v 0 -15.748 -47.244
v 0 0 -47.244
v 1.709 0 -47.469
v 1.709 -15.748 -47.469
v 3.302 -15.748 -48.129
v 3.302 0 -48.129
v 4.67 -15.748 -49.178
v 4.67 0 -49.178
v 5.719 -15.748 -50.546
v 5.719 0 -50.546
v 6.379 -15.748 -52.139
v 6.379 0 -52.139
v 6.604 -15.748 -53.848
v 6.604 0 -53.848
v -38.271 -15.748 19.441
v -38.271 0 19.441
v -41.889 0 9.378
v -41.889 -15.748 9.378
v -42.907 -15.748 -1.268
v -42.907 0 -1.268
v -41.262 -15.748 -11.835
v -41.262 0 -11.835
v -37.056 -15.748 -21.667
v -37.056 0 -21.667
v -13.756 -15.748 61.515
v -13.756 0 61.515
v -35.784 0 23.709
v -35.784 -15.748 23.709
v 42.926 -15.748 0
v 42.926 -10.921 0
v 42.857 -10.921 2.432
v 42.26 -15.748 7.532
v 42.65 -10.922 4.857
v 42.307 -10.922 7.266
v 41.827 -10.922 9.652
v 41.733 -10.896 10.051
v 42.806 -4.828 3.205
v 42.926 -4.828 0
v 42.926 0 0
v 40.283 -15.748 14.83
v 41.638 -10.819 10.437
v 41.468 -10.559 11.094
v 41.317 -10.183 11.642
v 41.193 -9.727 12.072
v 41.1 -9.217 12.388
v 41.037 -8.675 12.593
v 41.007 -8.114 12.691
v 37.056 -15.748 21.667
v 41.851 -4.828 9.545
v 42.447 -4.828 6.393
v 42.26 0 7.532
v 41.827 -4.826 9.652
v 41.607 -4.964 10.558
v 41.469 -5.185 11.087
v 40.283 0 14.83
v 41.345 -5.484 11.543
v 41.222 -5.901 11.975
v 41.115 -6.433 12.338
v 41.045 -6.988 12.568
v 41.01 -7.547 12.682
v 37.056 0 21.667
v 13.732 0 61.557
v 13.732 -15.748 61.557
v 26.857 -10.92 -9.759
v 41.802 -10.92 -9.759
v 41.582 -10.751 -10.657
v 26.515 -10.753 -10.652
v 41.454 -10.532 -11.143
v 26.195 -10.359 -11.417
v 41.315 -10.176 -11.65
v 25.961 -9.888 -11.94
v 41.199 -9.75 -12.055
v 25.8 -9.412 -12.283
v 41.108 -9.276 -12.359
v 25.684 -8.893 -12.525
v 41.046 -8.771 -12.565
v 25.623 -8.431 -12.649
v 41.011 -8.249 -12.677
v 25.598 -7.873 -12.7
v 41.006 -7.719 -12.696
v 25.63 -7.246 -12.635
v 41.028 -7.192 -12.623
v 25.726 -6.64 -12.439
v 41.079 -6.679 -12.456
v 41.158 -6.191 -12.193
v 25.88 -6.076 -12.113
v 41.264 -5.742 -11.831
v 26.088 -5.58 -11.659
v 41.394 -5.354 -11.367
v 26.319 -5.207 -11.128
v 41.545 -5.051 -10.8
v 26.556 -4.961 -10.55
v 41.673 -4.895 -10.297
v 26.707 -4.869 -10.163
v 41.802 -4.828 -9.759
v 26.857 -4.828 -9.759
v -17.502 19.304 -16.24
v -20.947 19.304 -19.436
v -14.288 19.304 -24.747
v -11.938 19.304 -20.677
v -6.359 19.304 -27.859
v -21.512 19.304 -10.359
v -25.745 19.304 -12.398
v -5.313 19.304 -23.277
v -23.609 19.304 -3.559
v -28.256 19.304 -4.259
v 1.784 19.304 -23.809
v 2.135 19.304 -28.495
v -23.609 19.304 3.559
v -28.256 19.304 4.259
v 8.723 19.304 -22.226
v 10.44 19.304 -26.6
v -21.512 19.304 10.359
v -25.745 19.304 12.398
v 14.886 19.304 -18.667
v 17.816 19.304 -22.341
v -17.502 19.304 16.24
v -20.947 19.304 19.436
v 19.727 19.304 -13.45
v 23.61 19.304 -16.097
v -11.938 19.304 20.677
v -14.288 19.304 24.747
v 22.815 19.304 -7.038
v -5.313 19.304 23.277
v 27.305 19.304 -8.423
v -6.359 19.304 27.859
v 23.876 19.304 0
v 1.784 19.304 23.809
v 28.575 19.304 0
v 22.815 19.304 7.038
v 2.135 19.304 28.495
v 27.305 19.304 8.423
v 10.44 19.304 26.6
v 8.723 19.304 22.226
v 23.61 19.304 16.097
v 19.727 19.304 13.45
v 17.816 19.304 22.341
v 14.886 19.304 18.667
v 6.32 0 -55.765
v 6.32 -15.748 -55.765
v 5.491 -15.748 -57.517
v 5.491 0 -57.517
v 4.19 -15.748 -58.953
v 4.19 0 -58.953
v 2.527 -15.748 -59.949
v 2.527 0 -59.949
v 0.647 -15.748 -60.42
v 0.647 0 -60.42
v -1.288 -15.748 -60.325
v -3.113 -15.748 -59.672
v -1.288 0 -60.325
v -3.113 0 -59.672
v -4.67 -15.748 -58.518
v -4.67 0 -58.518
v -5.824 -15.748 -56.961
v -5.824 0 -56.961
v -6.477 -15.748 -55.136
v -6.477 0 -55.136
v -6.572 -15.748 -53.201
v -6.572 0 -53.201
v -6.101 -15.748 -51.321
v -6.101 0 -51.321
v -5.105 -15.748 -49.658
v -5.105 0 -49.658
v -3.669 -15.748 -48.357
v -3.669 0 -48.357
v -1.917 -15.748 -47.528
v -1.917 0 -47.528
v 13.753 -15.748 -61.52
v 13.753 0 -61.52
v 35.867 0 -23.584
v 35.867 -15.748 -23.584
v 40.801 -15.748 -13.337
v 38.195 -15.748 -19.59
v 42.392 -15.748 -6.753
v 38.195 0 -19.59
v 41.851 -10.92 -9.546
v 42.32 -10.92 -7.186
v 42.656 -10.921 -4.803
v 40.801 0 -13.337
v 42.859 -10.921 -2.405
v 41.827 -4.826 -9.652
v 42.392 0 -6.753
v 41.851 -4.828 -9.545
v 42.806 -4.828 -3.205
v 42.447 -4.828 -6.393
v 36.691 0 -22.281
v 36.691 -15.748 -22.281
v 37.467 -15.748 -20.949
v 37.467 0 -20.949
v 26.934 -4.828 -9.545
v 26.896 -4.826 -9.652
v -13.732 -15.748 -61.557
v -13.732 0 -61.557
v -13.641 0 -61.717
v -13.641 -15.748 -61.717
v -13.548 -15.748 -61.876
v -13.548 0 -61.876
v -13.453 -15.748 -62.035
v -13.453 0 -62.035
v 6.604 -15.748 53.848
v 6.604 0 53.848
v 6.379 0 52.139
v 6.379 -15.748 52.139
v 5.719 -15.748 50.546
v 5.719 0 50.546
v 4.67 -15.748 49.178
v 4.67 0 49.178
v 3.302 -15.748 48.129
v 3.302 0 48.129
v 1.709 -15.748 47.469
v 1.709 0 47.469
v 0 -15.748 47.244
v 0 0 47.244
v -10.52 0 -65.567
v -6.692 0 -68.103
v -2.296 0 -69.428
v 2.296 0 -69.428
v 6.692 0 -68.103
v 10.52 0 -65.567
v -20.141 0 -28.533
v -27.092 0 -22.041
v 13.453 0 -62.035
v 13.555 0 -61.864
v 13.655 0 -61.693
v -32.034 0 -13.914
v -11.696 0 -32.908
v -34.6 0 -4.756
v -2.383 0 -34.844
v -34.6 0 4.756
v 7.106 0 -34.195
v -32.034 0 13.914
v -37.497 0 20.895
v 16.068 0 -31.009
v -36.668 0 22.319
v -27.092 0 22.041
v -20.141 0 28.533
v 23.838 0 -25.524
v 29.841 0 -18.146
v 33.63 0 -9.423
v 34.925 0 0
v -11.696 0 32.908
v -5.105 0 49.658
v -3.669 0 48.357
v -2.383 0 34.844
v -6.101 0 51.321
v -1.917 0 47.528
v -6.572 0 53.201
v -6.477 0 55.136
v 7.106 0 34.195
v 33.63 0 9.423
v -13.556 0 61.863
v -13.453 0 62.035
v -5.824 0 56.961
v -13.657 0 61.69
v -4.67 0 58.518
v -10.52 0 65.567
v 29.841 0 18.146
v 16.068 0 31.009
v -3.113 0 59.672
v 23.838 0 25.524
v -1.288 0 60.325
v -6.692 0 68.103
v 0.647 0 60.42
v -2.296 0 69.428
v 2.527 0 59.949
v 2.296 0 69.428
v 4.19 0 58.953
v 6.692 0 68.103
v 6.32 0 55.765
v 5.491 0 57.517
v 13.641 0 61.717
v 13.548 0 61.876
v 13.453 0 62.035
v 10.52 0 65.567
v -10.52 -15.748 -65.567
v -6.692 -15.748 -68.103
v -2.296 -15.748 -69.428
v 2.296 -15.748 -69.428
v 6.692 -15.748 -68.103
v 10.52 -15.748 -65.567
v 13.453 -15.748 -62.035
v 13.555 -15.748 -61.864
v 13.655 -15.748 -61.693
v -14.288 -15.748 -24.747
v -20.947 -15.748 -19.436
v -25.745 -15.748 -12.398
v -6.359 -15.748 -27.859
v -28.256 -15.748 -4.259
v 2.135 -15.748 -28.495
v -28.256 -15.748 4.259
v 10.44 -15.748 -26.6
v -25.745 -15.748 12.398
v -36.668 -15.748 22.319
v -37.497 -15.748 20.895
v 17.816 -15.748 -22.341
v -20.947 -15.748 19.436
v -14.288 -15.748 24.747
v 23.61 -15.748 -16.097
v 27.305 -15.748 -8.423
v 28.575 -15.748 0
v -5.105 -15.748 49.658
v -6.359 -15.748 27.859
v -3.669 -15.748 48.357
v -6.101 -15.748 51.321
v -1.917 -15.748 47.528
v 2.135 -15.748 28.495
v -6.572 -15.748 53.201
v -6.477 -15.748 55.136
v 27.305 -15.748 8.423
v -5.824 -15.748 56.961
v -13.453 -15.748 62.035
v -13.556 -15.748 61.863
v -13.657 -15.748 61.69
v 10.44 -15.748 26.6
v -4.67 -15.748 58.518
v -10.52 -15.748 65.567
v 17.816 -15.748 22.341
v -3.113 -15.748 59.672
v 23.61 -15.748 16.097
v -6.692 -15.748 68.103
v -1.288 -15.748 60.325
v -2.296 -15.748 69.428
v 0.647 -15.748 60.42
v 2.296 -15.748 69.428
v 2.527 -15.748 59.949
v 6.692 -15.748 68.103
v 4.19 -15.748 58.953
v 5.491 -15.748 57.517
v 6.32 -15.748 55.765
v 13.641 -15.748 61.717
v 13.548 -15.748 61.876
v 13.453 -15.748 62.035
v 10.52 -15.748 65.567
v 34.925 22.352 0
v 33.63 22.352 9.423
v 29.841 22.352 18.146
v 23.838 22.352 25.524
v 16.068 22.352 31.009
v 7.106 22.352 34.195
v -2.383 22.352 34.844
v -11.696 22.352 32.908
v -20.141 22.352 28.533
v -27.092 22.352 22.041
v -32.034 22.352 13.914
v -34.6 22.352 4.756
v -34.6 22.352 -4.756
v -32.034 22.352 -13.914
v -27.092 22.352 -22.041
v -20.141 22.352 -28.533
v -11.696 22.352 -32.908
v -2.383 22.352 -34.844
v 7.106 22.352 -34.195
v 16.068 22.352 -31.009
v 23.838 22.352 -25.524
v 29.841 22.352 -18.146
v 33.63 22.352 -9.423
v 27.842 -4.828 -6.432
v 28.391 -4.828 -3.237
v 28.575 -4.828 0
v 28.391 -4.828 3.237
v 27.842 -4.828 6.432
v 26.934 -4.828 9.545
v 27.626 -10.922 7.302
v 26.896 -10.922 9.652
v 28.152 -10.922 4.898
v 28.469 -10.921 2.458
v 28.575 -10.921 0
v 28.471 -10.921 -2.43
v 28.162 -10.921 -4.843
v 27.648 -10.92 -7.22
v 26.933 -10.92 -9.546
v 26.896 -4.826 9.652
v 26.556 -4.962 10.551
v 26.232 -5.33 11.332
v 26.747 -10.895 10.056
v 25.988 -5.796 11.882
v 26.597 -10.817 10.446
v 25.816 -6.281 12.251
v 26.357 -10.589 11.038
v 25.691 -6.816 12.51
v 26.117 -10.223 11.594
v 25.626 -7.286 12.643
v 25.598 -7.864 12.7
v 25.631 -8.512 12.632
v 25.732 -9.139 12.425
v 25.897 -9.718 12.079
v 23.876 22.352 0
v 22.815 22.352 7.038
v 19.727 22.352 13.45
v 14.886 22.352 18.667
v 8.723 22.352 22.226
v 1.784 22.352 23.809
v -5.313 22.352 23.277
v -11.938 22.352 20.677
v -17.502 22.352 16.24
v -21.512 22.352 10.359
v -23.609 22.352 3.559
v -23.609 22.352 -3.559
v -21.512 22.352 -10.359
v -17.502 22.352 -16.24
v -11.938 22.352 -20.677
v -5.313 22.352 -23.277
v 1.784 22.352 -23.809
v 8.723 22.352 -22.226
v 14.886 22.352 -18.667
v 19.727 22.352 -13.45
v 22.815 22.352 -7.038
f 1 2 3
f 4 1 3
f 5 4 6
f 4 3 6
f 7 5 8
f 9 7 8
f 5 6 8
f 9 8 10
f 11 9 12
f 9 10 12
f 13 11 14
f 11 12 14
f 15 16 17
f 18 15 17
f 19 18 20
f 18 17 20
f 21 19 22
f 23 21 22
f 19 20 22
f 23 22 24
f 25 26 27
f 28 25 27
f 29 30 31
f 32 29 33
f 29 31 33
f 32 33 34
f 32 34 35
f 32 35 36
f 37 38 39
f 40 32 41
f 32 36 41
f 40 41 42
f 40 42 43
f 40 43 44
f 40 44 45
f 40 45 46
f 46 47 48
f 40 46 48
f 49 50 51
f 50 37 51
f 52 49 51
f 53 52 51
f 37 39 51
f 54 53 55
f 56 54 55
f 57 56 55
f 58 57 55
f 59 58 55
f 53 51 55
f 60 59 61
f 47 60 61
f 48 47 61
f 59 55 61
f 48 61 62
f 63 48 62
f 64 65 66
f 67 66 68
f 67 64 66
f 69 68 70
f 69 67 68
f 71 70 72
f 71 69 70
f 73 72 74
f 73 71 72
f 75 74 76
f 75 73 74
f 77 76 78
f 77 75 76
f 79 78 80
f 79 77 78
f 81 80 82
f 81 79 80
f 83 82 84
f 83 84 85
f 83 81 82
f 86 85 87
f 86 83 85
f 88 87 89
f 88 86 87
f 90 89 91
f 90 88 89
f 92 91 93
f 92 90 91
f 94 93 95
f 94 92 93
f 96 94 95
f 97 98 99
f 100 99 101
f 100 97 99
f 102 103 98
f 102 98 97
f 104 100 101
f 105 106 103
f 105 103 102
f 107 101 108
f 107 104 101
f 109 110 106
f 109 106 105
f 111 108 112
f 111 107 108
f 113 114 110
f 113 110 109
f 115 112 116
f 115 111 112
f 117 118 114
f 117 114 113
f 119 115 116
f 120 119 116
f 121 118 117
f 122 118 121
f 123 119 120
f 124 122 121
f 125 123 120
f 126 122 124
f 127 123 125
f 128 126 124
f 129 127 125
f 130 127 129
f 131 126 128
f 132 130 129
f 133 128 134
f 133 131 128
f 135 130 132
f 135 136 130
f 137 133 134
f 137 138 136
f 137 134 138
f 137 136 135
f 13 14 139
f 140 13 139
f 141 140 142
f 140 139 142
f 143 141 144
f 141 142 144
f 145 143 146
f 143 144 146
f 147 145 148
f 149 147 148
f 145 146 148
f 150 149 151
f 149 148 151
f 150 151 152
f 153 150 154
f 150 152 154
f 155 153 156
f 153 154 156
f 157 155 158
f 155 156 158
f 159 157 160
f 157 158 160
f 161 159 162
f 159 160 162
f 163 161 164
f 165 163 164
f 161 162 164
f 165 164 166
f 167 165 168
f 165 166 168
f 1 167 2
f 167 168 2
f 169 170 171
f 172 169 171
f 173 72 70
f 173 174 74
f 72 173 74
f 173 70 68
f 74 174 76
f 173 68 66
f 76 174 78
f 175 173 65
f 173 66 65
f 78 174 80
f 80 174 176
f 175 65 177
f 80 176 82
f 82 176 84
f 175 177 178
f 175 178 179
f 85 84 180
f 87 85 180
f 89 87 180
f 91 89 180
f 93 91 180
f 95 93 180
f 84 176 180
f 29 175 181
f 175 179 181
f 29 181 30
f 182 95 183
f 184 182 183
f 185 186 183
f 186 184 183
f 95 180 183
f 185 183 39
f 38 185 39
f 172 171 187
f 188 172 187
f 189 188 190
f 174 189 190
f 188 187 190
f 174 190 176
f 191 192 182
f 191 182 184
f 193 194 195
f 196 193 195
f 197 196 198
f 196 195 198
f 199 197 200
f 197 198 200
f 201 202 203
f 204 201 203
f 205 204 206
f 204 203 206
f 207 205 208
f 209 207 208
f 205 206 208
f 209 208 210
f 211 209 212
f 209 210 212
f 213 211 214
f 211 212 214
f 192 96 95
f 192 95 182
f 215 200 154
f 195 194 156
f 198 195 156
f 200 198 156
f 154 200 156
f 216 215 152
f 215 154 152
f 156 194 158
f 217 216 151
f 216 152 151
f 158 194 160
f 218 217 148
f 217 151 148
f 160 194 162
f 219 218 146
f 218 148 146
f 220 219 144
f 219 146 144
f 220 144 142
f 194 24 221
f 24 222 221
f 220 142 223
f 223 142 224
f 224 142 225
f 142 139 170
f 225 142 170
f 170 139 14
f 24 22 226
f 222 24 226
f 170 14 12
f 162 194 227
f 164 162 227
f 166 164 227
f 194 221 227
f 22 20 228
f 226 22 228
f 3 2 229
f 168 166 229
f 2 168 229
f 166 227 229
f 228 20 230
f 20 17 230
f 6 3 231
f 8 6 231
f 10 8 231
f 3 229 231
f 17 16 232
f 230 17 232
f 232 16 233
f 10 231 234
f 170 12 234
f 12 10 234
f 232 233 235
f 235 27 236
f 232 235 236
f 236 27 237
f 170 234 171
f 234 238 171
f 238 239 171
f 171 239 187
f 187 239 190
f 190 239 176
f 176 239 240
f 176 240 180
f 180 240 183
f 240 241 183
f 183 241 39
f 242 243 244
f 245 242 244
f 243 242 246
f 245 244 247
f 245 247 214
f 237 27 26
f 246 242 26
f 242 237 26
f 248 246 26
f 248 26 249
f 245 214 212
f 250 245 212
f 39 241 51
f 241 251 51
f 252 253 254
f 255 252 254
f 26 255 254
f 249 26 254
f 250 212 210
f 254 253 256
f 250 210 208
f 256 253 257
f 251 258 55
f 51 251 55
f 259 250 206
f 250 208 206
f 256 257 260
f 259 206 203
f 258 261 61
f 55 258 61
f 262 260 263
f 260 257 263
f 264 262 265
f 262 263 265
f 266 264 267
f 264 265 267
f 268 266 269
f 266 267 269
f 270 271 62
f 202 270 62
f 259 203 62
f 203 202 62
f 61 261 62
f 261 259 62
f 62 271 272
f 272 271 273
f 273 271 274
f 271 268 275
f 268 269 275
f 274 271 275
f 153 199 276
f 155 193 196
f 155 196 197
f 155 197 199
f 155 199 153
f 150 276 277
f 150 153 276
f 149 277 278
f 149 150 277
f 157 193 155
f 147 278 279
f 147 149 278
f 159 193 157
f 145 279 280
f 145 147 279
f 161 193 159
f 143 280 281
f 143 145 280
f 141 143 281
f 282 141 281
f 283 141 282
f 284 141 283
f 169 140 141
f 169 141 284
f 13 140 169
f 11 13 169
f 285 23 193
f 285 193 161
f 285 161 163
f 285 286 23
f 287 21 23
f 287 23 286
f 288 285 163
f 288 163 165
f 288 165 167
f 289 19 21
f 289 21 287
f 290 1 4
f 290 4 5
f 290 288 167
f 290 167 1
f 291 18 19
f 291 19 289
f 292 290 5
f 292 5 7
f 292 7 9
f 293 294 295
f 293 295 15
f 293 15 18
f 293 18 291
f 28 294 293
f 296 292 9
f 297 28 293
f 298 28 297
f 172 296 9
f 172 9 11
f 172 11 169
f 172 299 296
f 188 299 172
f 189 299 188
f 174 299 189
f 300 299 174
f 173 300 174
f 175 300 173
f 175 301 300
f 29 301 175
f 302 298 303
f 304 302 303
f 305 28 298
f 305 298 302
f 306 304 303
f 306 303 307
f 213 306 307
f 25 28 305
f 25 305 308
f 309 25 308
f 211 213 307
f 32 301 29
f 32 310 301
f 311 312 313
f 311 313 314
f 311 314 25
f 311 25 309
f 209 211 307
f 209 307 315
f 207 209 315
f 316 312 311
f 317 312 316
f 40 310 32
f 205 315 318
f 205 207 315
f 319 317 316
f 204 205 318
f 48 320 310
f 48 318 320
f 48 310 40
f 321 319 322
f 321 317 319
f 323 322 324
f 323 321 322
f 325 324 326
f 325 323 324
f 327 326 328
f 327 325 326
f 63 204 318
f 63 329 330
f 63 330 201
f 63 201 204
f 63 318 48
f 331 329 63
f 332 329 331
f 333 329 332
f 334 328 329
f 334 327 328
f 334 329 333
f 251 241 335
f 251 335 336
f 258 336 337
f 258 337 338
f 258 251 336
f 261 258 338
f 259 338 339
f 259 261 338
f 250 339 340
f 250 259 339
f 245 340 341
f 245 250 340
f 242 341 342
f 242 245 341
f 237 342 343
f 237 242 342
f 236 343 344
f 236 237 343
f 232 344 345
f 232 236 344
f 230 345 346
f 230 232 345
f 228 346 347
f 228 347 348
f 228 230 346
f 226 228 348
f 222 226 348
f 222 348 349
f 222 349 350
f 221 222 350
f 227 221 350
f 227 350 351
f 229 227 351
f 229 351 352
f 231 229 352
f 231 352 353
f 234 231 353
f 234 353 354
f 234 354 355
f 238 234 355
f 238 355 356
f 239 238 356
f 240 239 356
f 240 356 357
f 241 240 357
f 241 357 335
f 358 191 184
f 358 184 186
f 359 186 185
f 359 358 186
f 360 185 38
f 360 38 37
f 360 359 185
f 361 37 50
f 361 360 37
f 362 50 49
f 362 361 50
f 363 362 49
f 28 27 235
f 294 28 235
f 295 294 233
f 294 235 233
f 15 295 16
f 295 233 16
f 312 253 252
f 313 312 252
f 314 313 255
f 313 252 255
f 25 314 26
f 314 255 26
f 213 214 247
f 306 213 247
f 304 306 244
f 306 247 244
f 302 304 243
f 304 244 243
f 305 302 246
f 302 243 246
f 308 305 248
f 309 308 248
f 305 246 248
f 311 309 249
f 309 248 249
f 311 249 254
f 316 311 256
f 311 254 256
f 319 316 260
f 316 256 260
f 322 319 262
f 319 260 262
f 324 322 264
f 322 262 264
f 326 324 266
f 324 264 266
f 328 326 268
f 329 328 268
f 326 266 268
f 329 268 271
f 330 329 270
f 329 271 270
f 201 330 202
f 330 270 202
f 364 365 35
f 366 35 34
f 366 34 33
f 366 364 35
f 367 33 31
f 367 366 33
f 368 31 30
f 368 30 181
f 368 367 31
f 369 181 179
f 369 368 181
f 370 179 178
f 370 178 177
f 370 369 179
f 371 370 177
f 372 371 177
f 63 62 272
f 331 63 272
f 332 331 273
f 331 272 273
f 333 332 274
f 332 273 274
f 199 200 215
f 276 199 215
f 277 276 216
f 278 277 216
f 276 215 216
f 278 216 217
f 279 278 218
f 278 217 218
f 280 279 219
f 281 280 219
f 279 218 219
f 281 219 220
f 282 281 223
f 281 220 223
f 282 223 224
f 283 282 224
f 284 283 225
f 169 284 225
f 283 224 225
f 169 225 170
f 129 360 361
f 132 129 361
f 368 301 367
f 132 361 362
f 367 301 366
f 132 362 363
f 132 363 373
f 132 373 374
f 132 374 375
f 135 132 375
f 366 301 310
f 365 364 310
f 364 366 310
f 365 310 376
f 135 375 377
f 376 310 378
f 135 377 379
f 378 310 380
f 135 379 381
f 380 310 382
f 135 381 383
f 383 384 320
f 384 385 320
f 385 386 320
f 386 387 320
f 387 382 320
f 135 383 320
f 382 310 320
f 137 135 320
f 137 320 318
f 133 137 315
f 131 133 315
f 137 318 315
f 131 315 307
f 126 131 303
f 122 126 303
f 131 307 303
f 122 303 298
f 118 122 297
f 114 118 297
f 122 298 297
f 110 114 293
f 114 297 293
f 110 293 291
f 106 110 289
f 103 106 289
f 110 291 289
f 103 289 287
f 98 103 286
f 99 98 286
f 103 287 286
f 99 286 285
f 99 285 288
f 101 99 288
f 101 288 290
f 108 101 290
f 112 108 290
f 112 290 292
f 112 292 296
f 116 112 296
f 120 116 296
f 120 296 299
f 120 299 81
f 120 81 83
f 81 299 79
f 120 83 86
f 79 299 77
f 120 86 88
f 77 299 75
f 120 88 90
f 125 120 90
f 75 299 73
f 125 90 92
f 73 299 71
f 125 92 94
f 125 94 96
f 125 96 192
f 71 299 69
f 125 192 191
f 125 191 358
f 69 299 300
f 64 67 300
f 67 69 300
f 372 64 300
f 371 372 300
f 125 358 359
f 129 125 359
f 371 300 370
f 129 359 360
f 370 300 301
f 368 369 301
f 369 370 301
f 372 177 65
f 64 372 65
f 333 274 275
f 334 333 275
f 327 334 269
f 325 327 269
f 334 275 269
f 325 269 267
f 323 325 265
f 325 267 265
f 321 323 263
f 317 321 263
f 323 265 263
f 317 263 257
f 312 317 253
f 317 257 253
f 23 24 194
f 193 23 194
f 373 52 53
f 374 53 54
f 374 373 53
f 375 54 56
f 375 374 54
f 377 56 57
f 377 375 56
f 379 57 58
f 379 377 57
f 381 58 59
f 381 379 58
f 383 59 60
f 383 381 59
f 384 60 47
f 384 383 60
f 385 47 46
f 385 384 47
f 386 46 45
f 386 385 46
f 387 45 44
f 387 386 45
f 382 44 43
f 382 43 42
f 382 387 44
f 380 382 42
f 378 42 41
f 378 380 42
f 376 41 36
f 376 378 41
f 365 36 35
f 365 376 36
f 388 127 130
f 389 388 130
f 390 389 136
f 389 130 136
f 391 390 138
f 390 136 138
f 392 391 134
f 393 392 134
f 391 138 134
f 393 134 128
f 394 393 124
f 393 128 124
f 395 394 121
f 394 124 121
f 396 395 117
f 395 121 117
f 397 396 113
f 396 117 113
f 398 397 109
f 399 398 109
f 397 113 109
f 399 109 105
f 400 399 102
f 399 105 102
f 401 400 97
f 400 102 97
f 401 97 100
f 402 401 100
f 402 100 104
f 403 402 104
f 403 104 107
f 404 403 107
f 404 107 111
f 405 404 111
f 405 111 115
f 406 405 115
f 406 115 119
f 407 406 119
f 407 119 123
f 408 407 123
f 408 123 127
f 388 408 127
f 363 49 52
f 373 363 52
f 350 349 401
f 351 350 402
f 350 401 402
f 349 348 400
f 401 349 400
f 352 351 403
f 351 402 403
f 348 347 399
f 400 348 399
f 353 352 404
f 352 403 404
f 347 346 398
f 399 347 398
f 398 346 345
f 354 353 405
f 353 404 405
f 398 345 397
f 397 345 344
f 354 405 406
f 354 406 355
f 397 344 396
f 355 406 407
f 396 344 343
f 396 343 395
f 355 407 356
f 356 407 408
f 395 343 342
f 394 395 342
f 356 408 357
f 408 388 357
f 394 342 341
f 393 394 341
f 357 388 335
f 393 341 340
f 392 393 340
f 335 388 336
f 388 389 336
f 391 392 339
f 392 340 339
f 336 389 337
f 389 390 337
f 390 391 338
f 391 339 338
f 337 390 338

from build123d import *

# Parameters (mm, degrees)
F1_DEPTH  = 15.748
F2_R      = 34.925
F3_DEPTH  = 38.1
F4_R      = 23.876
F5_DEPTH  = 38.1
F6_R      = 23.876
F7_DEPTH  = 38.1
F9_DEPTH  = 50.8
F10_R     = 28.575
F10_R_2   = 23.876
F11_DEPTH = 35.052


with BuildPart() as f1:
    # F0 (on Front) → F1 (new body)
    with BuildSketch(Plane.XZ):
        with BuildLine():
            Line((35.867186, -23.583606), (38.19529, -19.589827))
            ThreePointArc((38.19529, -19.589827), (41.726565, -10.076469), (42.926, 0))
            ThreePointArc((42.926, 0), (41.43258, 11.224206), (37.056234, 21.667419))
            ThreePointArc((37.056234, 21.667419), (25.604433, 34.453657), (10.058576, 41.730882))
            ThreePointArc((10.058576, 41.730882), (5.346921, 39.035507), (0, 38.1))
            Line((0, 38.1), (0, 0))
            Line((0, 0), (0, -38.1))
            ThreePointArc((0, -38.1), (5.346921, -39.035507), (10.058576, -41.730882))
            ThreePointArc((10.058576, -41.730882), (24.690581, -35.114337), (35.867186, -23.583606))
        make_face()
        with BuildLine():
            ThreePointArc((35.867186, -23.583606), (37.085039, -21.618079), (38.19529, -19.589827))
            Line((38.19529, -19.589827), (35.867186, -23.583606))
        make_face()
        with BuildLine():
            Line((13.752612, -61.520364), (35.867186, -23.583606))
            ThreePointArc((35.867186, -23.583606), (24.690581, -35.114337), (10.058576, -41.730882))
            ThreePointArc((10.058576, -41.730882), (14.254858, -47.15483), (15.748, -53.848))
            ThreePointArc((15.748, -53.848), (15.240991, -57.811797), (13.752612, -61.520364))
        make_face()
        with BuildLine():
            ThreePointArc((10.058576, 41.730882), (25.604433, 34.453657), (37.056234, 21.667419))
            Line((37.056234, 21.667419), (13.73214, 61.556945))
            ThreePointArc((13.73214, 61.556945), (15.235702, 57.832078), (15.748, 53.848))
            ThreePointArc((15.748, 53.848), (14.254858, 47.15483), (10.058576, 41.730882))
        make_face()
        with BuildLine():
            ThreePointArc((6.604, -53.848), (4.669733, -49.178267), (0, -47.244))
            ThreePointArc((0, -47.244), (-4.669733, -58.517733), (6.604, -53.848))
        make_face()
        with BuildLine():
            ThreePointArc((15.748, -53.848), (14.254858, -47.15483), (10.058576, -41.730882))
            ThreePointArc((10.058576, -41.730882), (5.064663, -42.626173), (0, -42.926))
            ThreePointArc((0, -42.926), (-5.064663, -42.626173), (-10.058576, -41.730882))
            ThreePointArc((-10.058576, -41.730882), (-15.484435, -50.978895), (-13.73214, -61.556945))
            Line((-13.73214, -61.556945), (-13.452853, -62.034589))
            ThreePointArc((-13.452853, -62.034589), (0, -69.596), (13.452853, -62.034589))
            Line((13.452853, -62.034589), (13.752612, -61.520364))
            ThreePointArc((13.752612, -61.520364), (15.240991, -57.811797), (15.748, -53.848))
        make_face()
        with BuildLine():
            ThreePointArc((6.604, -53.848), (-4.669733, -58.517733), (0, -47.244))
            ThreePointArc((0, -47.244), (4.669733, -49.178267), (6.604, -53.848))
        make_face(mode=Mode.SUBTRACT)
        with BuildLine():
            ThreePointArc((13.452853, -62.034589), (13.605162, -61.778893), (13.752612, -61.520364))
            Line((13.752612, -61.520364), (13.452853, -62.034589))
        make_face()
        with BuildLine():
            ThreePointArc((6.604, 53.848), (-4.669733, 58.517733), (0, 47.244))
            ThreePointArc((0, 47.244), (4.669733, 49.178267), (6.604, 53.848))
        make_face()
        with BuildLine():
            ThreePointArc((0, 42.926), (5.064663, 42.626173), (10.058576, 41.730882))
            ThreePointArc((10.058576, 41.730882), (14.254858, 47.15483), (15.748, 53.848))
            ThreePointArc((15.748, 53.848), (15.235702, 57.832078), (13.73214, 61.556945))
            Line((13.73214, 61.556945), (13.452853, 62.034589))
            ThreePointArc((13.452853, 62.034589), (0, 69.596), (-13.452853, 62.034589))
            Line((-13.452853, 62.034589), (-13.755504, 61.515177))
            ThreePointArc((-13.755504, 61.515177), (-15.480058, 50.955369), (-10.058576, 41.730882))
            ThreePointArc((-10.058576, 41.730882), (-5.064663, 42.626173), (0, 42.926))
        make_face()
        with BuildLine():
            ThreePointArc((6.604, 53.848), (4.669733, 49.178267), (0, 47.244))
            ThreePointArc((0, 47.244), (-4.669733, 58.517733), (6.604, 53.848))
        make_face(mode=Mode.SUBTRACT)
        with BuildLine():
            Line((13.452853, 62.034589), (13.73214, 61.556945))
            ThreePointArc((13.73214, 61.556945), (13.594595, 61.796994), (13.452853, 62.034589))
        make_face()
        with BuildLine():
            ThreePointArc((-10.058576, -41.730882), (-5.346921, -39.035507), (0, -38.1))
            Line((0, -38.1), (0, 0))
            Line((0, 0), (0, 38.1))
            ThreePointArc((0, 38.1), (-5.346921, 39.035507), (-10.058576, 41.730882))
            ThreePointArc((-10.058576, 41.730882), (-24.629018, 35.157545), (-35.784322, 23.70915))
            Line((-35.784322, 23.70915), (-38.271037, 19.441429))
            ThreePointArc((-38.271037, 19.441429), (-42.90727, -1.267948), (-37.056234, -21.667418))
            ThreePointArc((-37.056234, -21.667418), (-25.604433, -34.453657), (-10.058576, -41.730882))
        make_face()
        with BuildLine():
            ThreePointArc((-13.73214, -61.556945), (-15.484435, -50.978895), (-10.058576, -41.730882))
            ThreePointArc((-10.058576, -41.730882), (-25.604433, -34.453657), (-37.056234, -21.667418))
            Line((-37.056234, -21.667418), (-13.73214, -61.556945))
        make_face()
        with BuildLine():
            ThreePointArc((-13.73214, -61.556945), (-13.594595, -61.796994), (-13.452853, -62.034589))
            Line((-13.452853, -62.034589), (-13.73214, -61.556945))
        make_face()
        with BuildLine():
            ThreePointArc((-35.784322, 23.70915), (-24.629018, 35.157545), (-10.058576, 41.730882))
            ThreePointArc((-10.058576, 41.730882), (-15.480058, 50.955369), (-13.755504, 61.515177))
            Line((-13.755504, 61.515177), (-35.784322, 23.70915))
        make_face()
        with BuildLine():
            Line((-13.755504, 61.515177), (-13.452853, 62.034589))
            ThreePointArc((-13.452853, 62.034589), (-13.606657, 61.776328), (-13.755504, 61.515177))
        make_face()
        with BuildLine():
            Line((-38.271037, 19.441429), (-35.784322, 23.70915))
            ThreePointArc((-35.784322, 23.70915), (-37.089114, 21.611087), (-38.271037, 19.441429))
        make_face()
        with BuildLine():
            ThreePointArc((0, 38.1), (5.346921, 39.035507), (10.058576, 41.730882))
            ThreePointArc((10.058576, 41.730882), (5.064663, 42.626173), (0, 42.926))
            Line((0, 42.926), (0, 38.1))
        make_face()
        with BuildLine():
            Line((0, 38.1), (0, 42.926))
            ThreePointArc((0, 42.926), (-5.064663, 42.626173), (-10.058576, 41.730882))
            ThreePointArc((-10.058576, 41.730882), (-5.346921, 39.035507), (0, 38.1))
        make_face()
        with BuildLine():
            ThreePointArc((0, -42.926), (5.064663, -42.626173), (10.058576, -41.730882))
            ThreePointArc((10.058576, -41.730882), (5.346921, -39.035507), (0, -38.1))
            Line((0, -38.1), (0, -42.926))
        make_face()
        with BuildLine():
            ThreePointArc((-10.058576, -41.730882), (-5.064663, -42.626173), (0, -42.926))
            Line((0, -42.926), (0, -38.1))
            ThreePointArc((0, -38.1), (-5.346921, -39.035507), (-10.058576, -41.730882))
        make_face()
    extrude(amount=F1_DEPTH)

    # F2 (on face) → F3 (join)
    with BuildSketch(Plane.XZ.offset(15.748)):
        Circle(F2_R)
    extrude(amount=-F3_DEPTH)

    # F4 (on face) → F5 (join)
    with BuildSketch(Plane.XZ.offset(15.748)):
        Circle(F4_R)
    extrude(amount=-F5_DEPTH)

    # F6 (on face) → F7 (cut)
    with BuildSketch(Plane.XZ.offset(15.748)):
        Circle(F6_R)
    extrude(amount=-F7_DEPTH, mode=Mode.SUBTRACT)

    # F8 (on Right) → F9 (cut)
    with BuildSketch(Plane.YZ):
        with BuildLine():
            Line((-7.874, 6.604), (-7.874, 0))
            Line((-7.874, 0), (-7.874, -6.604))
            ThreePointArc((-7.874, -6.604), (-5.75692, -7.459222), (-4.82788, -9.544963))
            Line((-4.82788, -9.544963), (-4.82788, 9.544963))
            ThreePointArc((-4.82788, 9.544963), (-5.75692, 7.459222), (-7.874, 6.604))
        make_face()
        with BuildLine():
            Line((-7.874, -6.604), (-7.874, 0))
            Line((-7.874, 0), (-7.874, 6.604))
            ThreePointArc((-7.874, 6.604), (-10.029157, 7.496634), (-10.922, 9.651705))
            Line((-10.922, 9.651705), (-10.920141, -9.545553))
            ThreePointArc((-10.920141, -9.545553), (-9.991292, -7.459427), (-7.874, -6.604))
        make_face()
        with BuildLine():
            ThreePointArc((-4.82788, -9.544963), (-5.75692, -7.459222), (-7.874, -6.604))
            ThreePointArc((-7.874, -6.604), (-9.991292, -7.459427), (-10.920141, -9.545553))
            Line((-10.920141, -9.545553), (-10.92012, -9.759037))
            ThreePointArc((-10.92012, -9.759037), (-7.874, -12.7), (-4.82788, -9.759037))
            Line((-4.82788, -9.759037), (-4.82788, -9.544963))
        make_face()
        with BuildLine():
            ThreePointArc((-10.922, 9.651705), (-10.029157, 7.496634), (-7.874, 6.604))
            ThreePointArc((-7.874, 6.604), (-5.75692, 7.459222), (-4.82788, 9.544963))
            ThreePointArc((-4.82788, 9.544963), (-4.82647, 9.598473), (-4.826, 9.652))
            ThreePointArc((-4.826, 9.652), (-7.874148, 12.7), (-10.922, 9.651705))
        make_face()
        with BuildLine():
            ThreePointArc((-4.826, -9.652), (-4.82647, -9.598473), (-4.82788, -9.544963))
            Line((-4.82788, -9.544963), (-4.82788, -9.759037))
            ThreePointArc((-4.82788, -9.759037), (-4.82647, -9.705527), (-4.826, -9.652))
        make_face()
        with BuildLine():
            Line((-10.92012, -9.759037), (-10.920141, -9.545553))
            ThreePointArc((-10.920141, -9.545553), (-10.922, -9.652295), (-10.92012, -9.759037))
        make_face()
    extrude(amount=F9_DEPTH, mode=Mode.SUBTRACT)

    # F10 (on face) → F11 (cut)
    with BuildSketch(Plane.XZ.offset(15.748)):
        Circle(F10_R)
        Circle(F10_R_2, mode=Mode.SUBTRACT)
    extrude(amount=-F11_DEPTH, mode=Mode.SUBTRACT)


solid = f1.part
